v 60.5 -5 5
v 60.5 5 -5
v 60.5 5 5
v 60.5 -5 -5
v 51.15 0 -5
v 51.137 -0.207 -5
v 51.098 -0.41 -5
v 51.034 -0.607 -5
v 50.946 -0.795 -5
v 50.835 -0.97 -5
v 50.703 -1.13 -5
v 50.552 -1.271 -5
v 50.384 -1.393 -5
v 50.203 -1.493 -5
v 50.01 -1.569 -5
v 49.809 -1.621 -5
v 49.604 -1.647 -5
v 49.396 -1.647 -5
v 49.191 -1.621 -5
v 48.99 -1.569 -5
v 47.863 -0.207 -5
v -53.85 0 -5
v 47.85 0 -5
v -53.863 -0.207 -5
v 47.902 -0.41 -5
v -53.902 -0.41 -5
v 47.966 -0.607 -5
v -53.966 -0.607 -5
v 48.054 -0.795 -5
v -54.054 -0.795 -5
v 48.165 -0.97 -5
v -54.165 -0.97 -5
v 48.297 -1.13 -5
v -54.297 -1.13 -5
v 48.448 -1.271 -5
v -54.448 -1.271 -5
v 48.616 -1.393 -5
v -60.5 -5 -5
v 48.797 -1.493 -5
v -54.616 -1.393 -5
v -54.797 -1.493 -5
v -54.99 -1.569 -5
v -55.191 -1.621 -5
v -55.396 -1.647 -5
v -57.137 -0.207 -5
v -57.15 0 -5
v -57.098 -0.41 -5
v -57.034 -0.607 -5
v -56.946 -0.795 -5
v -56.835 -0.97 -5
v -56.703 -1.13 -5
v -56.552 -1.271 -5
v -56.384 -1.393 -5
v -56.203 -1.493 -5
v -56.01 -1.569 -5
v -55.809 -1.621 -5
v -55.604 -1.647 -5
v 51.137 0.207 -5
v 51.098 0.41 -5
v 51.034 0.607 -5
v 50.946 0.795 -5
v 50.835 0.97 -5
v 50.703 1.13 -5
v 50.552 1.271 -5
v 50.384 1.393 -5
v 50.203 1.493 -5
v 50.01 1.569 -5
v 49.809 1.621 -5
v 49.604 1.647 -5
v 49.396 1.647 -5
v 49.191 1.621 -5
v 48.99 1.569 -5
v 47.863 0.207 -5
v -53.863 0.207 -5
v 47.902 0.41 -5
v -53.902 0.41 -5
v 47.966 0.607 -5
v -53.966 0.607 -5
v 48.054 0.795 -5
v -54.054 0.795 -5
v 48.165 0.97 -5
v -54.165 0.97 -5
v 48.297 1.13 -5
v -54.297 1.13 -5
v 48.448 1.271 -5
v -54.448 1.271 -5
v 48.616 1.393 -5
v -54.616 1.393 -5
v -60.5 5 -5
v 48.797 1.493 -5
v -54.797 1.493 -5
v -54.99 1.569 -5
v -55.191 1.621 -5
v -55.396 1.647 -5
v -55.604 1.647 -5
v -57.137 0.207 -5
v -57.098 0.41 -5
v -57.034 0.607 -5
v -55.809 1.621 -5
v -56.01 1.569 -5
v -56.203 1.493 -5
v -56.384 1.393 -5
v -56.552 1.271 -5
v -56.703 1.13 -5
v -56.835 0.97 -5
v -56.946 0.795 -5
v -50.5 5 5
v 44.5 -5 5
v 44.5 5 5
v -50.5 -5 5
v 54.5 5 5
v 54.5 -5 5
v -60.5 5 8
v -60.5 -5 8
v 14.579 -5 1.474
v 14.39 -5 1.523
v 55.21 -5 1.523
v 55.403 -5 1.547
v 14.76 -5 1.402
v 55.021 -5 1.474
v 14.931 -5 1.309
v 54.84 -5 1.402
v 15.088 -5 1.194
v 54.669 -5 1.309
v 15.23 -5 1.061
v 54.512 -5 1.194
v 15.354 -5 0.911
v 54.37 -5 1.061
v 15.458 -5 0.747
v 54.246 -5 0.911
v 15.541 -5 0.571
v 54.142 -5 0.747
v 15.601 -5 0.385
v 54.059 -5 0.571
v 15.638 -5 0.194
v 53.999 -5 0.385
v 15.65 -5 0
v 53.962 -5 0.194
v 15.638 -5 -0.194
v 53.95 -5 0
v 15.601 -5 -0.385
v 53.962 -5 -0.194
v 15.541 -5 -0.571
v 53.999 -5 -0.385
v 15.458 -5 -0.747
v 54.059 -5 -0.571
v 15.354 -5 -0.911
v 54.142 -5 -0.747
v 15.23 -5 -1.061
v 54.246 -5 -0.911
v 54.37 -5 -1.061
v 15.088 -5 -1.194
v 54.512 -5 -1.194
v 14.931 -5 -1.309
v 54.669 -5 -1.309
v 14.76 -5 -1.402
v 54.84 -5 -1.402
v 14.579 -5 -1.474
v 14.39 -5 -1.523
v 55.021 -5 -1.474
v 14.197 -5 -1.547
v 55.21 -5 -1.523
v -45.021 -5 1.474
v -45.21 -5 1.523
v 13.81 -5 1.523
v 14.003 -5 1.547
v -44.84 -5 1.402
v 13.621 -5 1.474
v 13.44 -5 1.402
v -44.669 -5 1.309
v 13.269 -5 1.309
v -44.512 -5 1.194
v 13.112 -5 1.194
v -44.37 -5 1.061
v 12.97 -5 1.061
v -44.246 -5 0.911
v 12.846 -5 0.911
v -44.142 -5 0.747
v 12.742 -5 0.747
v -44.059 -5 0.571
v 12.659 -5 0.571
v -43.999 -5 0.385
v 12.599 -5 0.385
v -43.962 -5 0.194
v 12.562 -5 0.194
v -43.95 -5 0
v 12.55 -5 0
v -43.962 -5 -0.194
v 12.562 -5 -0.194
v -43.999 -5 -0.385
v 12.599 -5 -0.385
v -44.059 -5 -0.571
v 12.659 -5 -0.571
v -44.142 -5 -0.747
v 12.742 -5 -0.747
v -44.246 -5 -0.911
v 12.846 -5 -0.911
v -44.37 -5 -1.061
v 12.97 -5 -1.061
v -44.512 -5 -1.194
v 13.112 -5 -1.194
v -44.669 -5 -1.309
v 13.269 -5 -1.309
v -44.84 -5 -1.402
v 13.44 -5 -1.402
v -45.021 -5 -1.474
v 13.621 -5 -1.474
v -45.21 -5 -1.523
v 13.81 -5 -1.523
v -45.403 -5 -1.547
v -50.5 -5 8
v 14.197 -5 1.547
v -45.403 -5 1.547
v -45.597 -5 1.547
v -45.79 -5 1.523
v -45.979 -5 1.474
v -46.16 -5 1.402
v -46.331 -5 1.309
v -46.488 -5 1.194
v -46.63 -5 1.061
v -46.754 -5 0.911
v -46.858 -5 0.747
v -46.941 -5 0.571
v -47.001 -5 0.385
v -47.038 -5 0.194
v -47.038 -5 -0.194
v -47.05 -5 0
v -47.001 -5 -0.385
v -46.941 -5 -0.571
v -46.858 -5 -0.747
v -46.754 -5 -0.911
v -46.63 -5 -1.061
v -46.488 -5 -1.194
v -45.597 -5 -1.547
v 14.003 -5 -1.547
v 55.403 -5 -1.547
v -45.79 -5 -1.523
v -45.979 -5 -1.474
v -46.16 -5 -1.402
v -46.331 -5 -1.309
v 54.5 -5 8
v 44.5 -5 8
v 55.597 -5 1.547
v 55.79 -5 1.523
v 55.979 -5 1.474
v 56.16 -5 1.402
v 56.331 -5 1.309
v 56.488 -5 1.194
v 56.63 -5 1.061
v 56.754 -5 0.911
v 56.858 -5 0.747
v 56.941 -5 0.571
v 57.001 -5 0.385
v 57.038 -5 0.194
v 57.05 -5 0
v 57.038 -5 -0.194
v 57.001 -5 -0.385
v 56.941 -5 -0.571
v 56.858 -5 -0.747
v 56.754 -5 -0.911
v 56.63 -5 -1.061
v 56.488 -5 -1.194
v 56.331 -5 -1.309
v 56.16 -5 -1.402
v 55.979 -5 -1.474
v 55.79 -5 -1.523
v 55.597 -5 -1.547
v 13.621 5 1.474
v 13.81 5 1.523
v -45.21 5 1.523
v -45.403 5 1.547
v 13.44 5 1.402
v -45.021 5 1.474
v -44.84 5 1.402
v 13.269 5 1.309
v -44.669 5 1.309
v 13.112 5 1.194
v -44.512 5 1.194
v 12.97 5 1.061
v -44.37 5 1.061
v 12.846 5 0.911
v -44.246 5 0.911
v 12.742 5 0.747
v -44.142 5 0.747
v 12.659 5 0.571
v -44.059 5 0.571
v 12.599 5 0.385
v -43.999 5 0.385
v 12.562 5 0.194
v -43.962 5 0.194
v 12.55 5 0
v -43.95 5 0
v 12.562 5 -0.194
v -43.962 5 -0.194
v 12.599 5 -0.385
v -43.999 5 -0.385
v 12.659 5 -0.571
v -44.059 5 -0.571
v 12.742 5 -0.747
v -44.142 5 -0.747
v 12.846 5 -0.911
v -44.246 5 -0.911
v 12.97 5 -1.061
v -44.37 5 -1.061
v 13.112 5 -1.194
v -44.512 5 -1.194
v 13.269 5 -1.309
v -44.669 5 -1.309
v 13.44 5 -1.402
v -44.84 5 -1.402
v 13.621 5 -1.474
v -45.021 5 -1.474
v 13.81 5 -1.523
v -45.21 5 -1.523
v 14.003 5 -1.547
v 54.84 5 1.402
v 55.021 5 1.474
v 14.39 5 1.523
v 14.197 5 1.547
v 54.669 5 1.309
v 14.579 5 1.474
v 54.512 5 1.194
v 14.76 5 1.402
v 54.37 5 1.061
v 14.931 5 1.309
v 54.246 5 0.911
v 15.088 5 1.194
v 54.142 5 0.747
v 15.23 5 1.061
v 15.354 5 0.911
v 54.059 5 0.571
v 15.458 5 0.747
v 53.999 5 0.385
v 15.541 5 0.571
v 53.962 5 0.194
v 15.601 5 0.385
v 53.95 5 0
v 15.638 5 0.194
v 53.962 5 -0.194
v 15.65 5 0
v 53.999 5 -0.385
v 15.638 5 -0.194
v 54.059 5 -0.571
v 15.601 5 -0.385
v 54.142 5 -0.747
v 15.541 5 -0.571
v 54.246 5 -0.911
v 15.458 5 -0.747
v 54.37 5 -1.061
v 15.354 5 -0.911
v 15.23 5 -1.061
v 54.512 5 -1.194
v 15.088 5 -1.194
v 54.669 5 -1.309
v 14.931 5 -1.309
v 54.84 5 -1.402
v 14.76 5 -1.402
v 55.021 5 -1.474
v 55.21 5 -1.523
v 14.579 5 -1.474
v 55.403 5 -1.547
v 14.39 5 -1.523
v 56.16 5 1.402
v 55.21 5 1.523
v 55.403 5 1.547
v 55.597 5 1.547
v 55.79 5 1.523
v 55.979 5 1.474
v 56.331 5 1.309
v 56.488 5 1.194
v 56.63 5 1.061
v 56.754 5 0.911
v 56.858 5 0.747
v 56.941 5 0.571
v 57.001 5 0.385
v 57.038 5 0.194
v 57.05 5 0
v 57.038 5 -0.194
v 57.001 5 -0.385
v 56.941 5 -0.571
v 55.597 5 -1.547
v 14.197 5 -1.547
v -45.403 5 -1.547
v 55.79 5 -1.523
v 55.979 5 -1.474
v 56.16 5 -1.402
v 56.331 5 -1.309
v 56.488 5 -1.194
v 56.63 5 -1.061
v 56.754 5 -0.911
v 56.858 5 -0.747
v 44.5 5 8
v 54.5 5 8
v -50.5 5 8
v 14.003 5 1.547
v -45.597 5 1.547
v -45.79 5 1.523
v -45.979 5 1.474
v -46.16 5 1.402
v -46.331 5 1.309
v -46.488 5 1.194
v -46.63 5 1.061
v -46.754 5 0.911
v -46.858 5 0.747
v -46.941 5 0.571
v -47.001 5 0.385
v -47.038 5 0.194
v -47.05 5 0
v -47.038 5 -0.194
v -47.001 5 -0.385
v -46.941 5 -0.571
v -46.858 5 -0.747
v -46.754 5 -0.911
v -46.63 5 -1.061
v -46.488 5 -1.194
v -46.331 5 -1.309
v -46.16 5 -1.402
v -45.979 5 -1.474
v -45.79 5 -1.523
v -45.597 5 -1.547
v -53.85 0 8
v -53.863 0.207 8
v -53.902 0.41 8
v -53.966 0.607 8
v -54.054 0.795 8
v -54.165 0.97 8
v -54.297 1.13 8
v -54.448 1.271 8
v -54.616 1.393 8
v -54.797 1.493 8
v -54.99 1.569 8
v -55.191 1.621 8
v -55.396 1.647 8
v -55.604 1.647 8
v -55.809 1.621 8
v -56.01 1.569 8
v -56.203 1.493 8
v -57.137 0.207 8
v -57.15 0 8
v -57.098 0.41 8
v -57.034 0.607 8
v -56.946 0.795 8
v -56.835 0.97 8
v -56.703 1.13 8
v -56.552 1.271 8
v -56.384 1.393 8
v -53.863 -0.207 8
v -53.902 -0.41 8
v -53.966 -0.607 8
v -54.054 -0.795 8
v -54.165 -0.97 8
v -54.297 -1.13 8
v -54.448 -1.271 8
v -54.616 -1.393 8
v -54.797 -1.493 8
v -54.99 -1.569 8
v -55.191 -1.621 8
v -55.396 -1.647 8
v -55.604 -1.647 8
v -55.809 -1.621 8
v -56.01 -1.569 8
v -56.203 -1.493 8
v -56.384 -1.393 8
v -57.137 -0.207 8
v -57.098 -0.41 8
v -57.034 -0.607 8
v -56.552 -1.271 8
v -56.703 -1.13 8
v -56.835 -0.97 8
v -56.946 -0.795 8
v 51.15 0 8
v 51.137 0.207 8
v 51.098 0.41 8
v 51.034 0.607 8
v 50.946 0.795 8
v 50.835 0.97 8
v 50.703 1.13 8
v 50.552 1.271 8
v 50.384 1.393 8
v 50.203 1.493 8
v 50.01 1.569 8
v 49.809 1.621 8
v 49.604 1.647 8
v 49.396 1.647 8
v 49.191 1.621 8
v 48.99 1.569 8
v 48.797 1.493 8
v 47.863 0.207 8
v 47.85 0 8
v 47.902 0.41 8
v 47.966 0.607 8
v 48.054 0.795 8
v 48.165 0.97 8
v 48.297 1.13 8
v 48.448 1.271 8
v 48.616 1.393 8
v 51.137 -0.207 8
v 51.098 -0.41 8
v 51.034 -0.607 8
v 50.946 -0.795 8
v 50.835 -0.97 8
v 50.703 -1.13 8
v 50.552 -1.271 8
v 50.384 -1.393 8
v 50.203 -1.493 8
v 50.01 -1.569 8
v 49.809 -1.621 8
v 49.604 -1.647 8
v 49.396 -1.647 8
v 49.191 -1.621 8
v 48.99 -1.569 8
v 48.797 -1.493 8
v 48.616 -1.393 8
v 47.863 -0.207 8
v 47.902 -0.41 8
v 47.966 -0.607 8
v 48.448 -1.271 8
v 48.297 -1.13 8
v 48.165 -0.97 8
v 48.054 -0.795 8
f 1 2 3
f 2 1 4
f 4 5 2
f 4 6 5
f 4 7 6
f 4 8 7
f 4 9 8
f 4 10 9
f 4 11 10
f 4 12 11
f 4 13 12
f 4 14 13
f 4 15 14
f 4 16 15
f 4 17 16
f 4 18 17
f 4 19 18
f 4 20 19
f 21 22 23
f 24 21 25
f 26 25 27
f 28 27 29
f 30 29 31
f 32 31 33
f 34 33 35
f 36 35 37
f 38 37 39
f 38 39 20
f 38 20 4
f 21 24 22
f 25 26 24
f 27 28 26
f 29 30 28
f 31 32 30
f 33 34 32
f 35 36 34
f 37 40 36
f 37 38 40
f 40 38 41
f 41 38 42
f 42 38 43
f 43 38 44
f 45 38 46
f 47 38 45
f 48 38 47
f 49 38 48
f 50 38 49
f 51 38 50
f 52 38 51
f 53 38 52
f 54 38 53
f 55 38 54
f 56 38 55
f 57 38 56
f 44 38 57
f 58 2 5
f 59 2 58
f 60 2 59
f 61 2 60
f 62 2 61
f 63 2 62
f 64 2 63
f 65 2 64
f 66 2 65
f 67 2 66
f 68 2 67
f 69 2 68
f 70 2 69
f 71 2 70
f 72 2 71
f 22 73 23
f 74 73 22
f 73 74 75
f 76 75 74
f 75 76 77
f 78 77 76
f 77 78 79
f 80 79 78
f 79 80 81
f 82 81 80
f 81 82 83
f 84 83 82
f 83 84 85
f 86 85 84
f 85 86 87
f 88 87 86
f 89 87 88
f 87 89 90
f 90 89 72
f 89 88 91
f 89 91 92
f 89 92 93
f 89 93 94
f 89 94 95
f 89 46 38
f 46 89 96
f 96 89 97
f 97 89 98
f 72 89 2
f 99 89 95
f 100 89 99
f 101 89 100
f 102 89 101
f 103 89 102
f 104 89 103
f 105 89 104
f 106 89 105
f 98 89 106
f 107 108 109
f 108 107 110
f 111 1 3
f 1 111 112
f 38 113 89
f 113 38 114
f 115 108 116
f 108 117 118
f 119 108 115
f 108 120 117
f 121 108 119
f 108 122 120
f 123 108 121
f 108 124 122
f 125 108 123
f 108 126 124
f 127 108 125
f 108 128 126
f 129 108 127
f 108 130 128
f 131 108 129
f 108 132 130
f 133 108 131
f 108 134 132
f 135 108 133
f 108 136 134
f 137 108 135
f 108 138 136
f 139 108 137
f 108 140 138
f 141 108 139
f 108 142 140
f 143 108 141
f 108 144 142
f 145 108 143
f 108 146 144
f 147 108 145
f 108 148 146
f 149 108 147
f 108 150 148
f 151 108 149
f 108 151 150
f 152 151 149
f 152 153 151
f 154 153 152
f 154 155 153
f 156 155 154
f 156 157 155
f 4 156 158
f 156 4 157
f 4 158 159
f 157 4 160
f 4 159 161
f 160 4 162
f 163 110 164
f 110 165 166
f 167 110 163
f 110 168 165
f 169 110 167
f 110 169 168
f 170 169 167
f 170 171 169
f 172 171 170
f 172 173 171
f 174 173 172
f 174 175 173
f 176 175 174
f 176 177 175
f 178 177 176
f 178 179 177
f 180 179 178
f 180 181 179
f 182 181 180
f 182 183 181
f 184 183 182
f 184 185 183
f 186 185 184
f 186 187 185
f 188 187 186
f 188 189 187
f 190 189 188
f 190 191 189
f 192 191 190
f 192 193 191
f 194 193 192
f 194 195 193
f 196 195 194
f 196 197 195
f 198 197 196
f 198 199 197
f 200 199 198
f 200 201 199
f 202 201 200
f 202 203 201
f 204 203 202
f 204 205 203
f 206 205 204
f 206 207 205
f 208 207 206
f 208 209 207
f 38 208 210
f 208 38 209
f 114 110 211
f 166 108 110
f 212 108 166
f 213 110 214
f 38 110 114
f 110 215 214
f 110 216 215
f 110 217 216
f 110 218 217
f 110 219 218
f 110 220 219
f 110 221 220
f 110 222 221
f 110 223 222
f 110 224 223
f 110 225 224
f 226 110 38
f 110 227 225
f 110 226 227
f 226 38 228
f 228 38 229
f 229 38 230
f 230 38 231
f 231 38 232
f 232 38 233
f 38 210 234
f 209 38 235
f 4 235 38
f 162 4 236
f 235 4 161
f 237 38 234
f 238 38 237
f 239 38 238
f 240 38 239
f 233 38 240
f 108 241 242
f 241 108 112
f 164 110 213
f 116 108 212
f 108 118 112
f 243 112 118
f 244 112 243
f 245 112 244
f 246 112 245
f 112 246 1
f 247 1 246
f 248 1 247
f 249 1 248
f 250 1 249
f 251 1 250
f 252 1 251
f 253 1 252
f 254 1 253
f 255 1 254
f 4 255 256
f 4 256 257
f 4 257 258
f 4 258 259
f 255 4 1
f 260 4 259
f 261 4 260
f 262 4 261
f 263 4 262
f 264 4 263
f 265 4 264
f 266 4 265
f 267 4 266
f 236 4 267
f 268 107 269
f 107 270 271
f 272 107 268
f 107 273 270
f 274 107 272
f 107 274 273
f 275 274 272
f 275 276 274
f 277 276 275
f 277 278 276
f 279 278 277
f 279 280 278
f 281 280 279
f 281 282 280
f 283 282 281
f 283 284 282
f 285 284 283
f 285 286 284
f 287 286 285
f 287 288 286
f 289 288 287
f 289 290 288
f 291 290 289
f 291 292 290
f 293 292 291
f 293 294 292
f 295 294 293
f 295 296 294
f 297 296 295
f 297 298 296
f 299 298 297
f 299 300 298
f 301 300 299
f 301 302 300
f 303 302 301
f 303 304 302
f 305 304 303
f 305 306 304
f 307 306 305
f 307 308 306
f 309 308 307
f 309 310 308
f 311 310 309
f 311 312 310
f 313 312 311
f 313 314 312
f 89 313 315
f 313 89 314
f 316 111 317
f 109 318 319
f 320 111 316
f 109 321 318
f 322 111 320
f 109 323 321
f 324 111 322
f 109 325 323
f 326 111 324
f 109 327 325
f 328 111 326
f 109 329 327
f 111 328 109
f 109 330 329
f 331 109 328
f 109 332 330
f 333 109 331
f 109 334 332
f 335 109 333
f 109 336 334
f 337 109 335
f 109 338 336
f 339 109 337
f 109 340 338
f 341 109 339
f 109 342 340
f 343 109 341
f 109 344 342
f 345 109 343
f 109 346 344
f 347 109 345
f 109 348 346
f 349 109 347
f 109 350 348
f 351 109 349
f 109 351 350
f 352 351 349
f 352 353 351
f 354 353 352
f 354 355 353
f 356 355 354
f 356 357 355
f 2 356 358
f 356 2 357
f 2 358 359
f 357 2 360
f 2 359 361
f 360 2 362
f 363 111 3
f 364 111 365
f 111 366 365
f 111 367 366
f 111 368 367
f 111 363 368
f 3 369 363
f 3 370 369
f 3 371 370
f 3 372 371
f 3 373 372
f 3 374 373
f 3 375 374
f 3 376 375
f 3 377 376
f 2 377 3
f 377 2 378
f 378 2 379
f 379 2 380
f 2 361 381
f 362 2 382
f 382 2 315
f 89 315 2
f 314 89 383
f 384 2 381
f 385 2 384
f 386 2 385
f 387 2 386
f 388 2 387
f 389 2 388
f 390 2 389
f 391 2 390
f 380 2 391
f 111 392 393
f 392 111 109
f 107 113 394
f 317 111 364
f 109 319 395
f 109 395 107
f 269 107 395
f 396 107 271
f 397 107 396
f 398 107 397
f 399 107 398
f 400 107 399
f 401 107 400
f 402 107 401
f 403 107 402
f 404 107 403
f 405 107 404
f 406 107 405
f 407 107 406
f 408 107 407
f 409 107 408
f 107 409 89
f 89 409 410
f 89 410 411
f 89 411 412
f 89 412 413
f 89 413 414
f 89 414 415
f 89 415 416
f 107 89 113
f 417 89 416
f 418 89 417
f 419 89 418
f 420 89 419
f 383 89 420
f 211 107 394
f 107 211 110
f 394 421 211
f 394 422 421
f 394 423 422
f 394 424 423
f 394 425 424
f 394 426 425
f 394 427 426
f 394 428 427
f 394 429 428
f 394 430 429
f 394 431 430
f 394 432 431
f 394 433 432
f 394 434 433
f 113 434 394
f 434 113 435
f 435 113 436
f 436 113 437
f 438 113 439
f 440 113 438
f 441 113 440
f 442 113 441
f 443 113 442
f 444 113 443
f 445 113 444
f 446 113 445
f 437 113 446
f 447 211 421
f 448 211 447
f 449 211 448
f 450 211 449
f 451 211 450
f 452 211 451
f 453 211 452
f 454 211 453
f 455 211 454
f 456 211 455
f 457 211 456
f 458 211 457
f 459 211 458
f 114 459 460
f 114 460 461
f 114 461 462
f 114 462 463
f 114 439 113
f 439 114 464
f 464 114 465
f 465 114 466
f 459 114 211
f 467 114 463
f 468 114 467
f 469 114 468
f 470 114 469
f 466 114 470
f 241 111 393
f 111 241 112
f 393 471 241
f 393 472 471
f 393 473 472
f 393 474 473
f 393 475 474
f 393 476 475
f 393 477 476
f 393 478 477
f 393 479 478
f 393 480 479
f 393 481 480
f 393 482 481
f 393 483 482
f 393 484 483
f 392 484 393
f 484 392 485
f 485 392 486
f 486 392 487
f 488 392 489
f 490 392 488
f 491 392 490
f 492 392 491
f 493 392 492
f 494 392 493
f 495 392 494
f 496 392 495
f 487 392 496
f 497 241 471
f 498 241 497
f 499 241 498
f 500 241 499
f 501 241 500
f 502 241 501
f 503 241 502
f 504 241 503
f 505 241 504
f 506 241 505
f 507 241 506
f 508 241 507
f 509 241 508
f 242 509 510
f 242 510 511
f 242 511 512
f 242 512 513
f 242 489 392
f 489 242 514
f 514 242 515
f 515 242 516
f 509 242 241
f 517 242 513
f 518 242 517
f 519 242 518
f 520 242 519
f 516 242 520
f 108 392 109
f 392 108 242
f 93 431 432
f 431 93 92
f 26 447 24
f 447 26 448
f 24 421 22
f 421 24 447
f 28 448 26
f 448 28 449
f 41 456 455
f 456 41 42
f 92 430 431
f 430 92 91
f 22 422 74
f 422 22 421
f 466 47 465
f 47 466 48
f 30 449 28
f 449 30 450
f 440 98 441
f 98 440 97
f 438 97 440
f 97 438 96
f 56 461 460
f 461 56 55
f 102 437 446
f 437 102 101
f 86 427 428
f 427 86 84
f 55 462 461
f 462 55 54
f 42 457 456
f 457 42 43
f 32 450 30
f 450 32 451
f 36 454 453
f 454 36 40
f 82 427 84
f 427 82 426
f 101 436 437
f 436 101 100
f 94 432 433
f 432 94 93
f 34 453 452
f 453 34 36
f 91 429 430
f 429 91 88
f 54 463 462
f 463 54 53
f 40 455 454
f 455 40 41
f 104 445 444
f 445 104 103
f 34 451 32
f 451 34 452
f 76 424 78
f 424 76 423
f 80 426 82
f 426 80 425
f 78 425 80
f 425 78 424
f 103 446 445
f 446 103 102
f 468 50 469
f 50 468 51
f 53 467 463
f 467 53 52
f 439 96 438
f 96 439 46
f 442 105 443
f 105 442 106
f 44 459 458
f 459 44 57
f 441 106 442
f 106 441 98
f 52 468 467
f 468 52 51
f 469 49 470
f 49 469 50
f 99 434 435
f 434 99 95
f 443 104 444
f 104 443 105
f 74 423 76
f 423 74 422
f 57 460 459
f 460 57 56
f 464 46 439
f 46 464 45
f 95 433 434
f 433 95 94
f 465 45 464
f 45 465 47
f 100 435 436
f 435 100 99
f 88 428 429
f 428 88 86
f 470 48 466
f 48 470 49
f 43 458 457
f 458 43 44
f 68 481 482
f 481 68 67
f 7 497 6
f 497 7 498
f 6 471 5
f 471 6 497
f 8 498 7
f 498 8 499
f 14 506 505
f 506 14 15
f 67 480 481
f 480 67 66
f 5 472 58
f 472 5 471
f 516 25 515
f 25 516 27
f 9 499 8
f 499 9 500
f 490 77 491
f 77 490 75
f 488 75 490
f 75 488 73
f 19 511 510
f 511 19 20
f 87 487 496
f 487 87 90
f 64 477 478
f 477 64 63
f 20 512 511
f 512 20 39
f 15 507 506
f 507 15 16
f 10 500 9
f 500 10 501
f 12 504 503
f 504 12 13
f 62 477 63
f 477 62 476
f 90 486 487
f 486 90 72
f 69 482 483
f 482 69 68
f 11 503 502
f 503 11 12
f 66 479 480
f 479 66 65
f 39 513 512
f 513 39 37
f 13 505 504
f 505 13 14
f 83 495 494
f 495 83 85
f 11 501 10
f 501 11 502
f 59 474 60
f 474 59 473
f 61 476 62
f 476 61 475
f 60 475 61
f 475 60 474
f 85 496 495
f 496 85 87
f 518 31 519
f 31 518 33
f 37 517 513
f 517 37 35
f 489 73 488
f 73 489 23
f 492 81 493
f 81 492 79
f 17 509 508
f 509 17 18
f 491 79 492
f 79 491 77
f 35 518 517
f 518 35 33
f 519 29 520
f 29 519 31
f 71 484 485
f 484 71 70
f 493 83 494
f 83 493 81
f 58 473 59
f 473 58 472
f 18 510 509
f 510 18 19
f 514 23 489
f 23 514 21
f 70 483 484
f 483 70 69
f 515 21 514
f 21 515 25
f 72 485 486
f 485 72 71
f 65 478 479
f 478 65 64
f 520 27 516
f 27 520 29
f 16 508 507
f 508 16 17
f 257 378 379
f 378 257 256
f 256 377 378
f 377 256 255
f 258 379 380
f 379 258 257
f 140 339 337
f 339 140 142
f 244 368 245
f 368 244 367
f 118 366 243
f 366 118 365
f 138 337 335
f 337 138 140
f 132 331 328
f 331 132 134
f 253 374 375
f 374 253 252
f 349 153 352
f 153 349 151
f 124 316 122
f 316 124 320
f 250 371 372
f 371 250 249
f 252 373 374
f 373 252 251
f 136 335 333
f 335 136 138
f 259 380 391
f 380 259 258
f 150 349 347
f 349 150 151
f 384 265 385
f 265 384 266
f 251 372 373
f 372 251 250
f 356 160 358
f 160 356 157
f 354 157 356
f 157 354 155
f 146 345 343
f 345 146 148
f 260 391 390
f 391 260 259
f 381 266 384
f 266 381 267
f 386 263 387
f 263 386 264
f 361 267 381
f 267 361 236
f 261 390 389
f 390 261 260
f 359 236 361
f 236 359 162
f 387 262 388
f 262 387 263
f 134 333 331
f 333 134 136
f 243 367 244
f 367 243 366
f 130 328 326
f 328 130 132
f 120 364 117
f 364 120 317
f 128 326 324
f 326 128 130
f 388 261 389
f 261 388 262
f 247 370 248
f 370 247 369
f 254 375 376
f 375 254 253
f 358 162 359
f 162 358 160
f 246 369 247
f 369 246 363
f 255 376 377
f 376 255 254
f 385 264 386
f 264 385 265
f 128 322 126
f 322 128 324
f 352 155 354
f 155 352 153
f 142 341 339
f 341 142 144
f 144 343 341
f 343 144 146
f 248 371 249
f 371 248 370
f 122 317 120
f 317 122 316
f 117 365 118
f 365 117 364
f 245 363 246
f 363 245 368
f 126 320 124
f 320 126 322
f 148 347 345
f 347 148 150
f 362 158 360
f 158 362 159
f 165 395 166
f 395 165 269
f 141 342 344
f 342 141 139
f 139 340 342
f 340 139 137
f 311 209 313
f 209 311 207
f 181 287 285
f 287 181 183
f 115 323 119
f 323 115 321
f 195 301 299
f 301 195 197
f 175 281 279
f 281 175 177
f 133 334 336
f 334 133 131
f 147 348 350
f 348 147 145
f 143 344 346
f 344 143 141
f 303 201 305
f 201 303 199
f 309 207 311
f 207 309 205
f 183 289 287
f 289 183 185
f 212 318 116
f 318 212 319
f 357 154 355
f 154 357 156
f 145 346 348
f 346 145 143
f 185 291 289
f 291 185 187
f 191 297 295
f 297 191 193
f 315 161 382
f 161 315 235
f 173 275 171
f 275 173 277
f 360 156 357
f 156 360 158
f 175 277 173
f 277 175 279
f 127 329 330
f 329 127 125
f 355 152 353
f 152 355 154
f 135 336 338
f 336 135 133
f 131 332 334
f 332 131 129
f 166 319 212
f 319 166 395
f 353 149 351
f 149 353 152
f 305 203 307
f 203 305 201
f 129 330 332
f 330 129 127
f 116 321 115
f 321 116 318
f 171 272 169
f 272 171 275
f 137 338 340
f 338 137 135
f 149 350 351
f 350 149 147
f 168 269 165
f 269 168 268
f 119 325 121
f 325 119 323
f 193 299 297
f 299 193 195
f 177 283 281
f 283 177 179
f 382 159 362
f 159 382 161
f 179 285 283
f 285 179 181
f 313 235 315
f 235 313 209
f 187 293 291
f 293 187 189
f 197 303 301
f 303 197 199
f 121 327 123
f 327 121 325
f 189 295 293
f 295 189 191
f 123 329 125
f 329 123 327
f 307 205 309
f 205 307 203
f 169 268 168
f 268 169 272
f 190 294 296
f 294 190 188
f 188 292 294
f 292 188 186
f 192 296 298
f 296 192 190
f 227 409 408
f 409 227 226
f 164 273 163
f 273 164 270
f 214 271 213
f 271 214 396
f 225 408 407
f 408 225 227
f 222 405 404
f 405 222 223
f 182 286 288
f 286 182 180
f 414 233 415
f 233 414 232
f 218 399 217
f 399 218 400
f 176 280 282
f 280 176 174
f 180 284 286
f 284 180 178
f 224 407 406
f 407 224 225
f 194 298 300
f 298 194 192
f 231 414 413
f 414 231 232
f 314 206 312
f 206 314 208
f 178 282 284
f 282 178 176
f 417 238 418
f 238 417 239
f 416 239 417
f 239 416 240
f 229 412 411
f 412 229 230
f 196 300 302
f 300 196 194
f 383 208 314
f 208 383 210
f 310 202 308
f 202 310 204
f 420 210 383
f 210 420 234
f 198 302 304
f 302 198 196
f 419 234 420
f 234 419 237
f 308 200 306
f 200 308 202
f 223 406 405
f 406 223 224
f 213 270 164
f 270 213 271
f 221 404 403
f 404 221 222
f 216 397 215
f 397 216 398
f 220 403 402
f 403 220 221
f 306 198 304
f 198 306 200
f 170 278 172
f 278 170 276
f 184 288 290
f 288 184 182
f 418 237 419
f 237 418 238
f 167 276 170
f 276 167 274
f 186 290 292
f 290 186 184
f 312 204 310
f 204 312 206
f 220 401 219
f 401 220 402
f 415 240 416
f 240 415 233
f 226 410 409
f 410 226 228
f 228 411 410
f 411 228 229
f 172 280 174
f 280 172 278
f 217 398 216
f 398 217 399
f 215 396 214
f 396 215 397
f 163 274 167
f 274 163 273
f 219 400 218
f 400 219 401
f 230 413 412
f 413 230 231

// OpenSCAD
// SSD mount to vertical side panel


mnt_slot_x = 105;
mnt_hole_dia = 3.3;
// width of mounting block 
block_y = 10;              
// length of mounting block
block_x_offset = 6;  
block_x = mnt_slot_x + 2 * (block_y/2) + block_x_offset;
// block height
block_z = 10;
// mounting pad z
block_pad_z = 3;

// holes for SSD mount
ssd_x1 = 0;
ssd_x2 = 101 - 59.6;
ssd_x3 = 101;
ssd_hole_dia = 3.1;

ssd_x_offset = 5;  // centerline offset from right edge

$fn = 50;

rotate ([180,0,0])
difference () {
    {
    union () {
        cube([block_x, block_y, block_z], center = true);

        // 1st pad for slots
        translate([-(block_x/2 - block_y/2), 0, -(block_y/2 + block_pad_z/2)])
        cube([block_y, block_y, block_pad_z], center = true);

        // 2nd pad for slots
        translate([(block_x/2 - block_y/2 - block_x_offset), 0, -(block_y/2 + block_pad_z/2)])
        cube([block_y, block_y, block_pad_z], center = true);
        }
    }
    {
    // rail holes
    translate([-(block_x/2 - block_y/2), 0, -(block_z/2)])
    cylinder(r = mnt_hole_dia/2, h = 2 * block_z, center = true);
    translate([(block_x/2 - block_y/2 - block_x_offset), 0, -(block_z/2)])
    cylinder(r = mnt_hole_dia/2, h = 2 * block_z, center = true);
        
    // SSD mount holes
    rotate([90,0,0])
    // right edge = block_x/2
    translate([(block_x/2 - ssd_x_offset - ssd_x1), 0, 0])
    cylinder(r = ssd_hole_dia/2, h = block_z, center = true);
    
    rotate([90,0,0])
    // right edge = block_x/2
    translate([(block_x/2 - ssd_x_offset - ssd_x2), 0, 0])
    cylinder(r = ssd_hole_dia/2, h = block_z, center = true);    
    
    rotate([90,0,0])
    // right edge = block_x/2
    translate([(block_x/2 - ssd_x_offset - ssd_x3), 0, 0])
    cylinder(r = ssd_hole_dia/2, h = block_z, center = true);   
    }
}
